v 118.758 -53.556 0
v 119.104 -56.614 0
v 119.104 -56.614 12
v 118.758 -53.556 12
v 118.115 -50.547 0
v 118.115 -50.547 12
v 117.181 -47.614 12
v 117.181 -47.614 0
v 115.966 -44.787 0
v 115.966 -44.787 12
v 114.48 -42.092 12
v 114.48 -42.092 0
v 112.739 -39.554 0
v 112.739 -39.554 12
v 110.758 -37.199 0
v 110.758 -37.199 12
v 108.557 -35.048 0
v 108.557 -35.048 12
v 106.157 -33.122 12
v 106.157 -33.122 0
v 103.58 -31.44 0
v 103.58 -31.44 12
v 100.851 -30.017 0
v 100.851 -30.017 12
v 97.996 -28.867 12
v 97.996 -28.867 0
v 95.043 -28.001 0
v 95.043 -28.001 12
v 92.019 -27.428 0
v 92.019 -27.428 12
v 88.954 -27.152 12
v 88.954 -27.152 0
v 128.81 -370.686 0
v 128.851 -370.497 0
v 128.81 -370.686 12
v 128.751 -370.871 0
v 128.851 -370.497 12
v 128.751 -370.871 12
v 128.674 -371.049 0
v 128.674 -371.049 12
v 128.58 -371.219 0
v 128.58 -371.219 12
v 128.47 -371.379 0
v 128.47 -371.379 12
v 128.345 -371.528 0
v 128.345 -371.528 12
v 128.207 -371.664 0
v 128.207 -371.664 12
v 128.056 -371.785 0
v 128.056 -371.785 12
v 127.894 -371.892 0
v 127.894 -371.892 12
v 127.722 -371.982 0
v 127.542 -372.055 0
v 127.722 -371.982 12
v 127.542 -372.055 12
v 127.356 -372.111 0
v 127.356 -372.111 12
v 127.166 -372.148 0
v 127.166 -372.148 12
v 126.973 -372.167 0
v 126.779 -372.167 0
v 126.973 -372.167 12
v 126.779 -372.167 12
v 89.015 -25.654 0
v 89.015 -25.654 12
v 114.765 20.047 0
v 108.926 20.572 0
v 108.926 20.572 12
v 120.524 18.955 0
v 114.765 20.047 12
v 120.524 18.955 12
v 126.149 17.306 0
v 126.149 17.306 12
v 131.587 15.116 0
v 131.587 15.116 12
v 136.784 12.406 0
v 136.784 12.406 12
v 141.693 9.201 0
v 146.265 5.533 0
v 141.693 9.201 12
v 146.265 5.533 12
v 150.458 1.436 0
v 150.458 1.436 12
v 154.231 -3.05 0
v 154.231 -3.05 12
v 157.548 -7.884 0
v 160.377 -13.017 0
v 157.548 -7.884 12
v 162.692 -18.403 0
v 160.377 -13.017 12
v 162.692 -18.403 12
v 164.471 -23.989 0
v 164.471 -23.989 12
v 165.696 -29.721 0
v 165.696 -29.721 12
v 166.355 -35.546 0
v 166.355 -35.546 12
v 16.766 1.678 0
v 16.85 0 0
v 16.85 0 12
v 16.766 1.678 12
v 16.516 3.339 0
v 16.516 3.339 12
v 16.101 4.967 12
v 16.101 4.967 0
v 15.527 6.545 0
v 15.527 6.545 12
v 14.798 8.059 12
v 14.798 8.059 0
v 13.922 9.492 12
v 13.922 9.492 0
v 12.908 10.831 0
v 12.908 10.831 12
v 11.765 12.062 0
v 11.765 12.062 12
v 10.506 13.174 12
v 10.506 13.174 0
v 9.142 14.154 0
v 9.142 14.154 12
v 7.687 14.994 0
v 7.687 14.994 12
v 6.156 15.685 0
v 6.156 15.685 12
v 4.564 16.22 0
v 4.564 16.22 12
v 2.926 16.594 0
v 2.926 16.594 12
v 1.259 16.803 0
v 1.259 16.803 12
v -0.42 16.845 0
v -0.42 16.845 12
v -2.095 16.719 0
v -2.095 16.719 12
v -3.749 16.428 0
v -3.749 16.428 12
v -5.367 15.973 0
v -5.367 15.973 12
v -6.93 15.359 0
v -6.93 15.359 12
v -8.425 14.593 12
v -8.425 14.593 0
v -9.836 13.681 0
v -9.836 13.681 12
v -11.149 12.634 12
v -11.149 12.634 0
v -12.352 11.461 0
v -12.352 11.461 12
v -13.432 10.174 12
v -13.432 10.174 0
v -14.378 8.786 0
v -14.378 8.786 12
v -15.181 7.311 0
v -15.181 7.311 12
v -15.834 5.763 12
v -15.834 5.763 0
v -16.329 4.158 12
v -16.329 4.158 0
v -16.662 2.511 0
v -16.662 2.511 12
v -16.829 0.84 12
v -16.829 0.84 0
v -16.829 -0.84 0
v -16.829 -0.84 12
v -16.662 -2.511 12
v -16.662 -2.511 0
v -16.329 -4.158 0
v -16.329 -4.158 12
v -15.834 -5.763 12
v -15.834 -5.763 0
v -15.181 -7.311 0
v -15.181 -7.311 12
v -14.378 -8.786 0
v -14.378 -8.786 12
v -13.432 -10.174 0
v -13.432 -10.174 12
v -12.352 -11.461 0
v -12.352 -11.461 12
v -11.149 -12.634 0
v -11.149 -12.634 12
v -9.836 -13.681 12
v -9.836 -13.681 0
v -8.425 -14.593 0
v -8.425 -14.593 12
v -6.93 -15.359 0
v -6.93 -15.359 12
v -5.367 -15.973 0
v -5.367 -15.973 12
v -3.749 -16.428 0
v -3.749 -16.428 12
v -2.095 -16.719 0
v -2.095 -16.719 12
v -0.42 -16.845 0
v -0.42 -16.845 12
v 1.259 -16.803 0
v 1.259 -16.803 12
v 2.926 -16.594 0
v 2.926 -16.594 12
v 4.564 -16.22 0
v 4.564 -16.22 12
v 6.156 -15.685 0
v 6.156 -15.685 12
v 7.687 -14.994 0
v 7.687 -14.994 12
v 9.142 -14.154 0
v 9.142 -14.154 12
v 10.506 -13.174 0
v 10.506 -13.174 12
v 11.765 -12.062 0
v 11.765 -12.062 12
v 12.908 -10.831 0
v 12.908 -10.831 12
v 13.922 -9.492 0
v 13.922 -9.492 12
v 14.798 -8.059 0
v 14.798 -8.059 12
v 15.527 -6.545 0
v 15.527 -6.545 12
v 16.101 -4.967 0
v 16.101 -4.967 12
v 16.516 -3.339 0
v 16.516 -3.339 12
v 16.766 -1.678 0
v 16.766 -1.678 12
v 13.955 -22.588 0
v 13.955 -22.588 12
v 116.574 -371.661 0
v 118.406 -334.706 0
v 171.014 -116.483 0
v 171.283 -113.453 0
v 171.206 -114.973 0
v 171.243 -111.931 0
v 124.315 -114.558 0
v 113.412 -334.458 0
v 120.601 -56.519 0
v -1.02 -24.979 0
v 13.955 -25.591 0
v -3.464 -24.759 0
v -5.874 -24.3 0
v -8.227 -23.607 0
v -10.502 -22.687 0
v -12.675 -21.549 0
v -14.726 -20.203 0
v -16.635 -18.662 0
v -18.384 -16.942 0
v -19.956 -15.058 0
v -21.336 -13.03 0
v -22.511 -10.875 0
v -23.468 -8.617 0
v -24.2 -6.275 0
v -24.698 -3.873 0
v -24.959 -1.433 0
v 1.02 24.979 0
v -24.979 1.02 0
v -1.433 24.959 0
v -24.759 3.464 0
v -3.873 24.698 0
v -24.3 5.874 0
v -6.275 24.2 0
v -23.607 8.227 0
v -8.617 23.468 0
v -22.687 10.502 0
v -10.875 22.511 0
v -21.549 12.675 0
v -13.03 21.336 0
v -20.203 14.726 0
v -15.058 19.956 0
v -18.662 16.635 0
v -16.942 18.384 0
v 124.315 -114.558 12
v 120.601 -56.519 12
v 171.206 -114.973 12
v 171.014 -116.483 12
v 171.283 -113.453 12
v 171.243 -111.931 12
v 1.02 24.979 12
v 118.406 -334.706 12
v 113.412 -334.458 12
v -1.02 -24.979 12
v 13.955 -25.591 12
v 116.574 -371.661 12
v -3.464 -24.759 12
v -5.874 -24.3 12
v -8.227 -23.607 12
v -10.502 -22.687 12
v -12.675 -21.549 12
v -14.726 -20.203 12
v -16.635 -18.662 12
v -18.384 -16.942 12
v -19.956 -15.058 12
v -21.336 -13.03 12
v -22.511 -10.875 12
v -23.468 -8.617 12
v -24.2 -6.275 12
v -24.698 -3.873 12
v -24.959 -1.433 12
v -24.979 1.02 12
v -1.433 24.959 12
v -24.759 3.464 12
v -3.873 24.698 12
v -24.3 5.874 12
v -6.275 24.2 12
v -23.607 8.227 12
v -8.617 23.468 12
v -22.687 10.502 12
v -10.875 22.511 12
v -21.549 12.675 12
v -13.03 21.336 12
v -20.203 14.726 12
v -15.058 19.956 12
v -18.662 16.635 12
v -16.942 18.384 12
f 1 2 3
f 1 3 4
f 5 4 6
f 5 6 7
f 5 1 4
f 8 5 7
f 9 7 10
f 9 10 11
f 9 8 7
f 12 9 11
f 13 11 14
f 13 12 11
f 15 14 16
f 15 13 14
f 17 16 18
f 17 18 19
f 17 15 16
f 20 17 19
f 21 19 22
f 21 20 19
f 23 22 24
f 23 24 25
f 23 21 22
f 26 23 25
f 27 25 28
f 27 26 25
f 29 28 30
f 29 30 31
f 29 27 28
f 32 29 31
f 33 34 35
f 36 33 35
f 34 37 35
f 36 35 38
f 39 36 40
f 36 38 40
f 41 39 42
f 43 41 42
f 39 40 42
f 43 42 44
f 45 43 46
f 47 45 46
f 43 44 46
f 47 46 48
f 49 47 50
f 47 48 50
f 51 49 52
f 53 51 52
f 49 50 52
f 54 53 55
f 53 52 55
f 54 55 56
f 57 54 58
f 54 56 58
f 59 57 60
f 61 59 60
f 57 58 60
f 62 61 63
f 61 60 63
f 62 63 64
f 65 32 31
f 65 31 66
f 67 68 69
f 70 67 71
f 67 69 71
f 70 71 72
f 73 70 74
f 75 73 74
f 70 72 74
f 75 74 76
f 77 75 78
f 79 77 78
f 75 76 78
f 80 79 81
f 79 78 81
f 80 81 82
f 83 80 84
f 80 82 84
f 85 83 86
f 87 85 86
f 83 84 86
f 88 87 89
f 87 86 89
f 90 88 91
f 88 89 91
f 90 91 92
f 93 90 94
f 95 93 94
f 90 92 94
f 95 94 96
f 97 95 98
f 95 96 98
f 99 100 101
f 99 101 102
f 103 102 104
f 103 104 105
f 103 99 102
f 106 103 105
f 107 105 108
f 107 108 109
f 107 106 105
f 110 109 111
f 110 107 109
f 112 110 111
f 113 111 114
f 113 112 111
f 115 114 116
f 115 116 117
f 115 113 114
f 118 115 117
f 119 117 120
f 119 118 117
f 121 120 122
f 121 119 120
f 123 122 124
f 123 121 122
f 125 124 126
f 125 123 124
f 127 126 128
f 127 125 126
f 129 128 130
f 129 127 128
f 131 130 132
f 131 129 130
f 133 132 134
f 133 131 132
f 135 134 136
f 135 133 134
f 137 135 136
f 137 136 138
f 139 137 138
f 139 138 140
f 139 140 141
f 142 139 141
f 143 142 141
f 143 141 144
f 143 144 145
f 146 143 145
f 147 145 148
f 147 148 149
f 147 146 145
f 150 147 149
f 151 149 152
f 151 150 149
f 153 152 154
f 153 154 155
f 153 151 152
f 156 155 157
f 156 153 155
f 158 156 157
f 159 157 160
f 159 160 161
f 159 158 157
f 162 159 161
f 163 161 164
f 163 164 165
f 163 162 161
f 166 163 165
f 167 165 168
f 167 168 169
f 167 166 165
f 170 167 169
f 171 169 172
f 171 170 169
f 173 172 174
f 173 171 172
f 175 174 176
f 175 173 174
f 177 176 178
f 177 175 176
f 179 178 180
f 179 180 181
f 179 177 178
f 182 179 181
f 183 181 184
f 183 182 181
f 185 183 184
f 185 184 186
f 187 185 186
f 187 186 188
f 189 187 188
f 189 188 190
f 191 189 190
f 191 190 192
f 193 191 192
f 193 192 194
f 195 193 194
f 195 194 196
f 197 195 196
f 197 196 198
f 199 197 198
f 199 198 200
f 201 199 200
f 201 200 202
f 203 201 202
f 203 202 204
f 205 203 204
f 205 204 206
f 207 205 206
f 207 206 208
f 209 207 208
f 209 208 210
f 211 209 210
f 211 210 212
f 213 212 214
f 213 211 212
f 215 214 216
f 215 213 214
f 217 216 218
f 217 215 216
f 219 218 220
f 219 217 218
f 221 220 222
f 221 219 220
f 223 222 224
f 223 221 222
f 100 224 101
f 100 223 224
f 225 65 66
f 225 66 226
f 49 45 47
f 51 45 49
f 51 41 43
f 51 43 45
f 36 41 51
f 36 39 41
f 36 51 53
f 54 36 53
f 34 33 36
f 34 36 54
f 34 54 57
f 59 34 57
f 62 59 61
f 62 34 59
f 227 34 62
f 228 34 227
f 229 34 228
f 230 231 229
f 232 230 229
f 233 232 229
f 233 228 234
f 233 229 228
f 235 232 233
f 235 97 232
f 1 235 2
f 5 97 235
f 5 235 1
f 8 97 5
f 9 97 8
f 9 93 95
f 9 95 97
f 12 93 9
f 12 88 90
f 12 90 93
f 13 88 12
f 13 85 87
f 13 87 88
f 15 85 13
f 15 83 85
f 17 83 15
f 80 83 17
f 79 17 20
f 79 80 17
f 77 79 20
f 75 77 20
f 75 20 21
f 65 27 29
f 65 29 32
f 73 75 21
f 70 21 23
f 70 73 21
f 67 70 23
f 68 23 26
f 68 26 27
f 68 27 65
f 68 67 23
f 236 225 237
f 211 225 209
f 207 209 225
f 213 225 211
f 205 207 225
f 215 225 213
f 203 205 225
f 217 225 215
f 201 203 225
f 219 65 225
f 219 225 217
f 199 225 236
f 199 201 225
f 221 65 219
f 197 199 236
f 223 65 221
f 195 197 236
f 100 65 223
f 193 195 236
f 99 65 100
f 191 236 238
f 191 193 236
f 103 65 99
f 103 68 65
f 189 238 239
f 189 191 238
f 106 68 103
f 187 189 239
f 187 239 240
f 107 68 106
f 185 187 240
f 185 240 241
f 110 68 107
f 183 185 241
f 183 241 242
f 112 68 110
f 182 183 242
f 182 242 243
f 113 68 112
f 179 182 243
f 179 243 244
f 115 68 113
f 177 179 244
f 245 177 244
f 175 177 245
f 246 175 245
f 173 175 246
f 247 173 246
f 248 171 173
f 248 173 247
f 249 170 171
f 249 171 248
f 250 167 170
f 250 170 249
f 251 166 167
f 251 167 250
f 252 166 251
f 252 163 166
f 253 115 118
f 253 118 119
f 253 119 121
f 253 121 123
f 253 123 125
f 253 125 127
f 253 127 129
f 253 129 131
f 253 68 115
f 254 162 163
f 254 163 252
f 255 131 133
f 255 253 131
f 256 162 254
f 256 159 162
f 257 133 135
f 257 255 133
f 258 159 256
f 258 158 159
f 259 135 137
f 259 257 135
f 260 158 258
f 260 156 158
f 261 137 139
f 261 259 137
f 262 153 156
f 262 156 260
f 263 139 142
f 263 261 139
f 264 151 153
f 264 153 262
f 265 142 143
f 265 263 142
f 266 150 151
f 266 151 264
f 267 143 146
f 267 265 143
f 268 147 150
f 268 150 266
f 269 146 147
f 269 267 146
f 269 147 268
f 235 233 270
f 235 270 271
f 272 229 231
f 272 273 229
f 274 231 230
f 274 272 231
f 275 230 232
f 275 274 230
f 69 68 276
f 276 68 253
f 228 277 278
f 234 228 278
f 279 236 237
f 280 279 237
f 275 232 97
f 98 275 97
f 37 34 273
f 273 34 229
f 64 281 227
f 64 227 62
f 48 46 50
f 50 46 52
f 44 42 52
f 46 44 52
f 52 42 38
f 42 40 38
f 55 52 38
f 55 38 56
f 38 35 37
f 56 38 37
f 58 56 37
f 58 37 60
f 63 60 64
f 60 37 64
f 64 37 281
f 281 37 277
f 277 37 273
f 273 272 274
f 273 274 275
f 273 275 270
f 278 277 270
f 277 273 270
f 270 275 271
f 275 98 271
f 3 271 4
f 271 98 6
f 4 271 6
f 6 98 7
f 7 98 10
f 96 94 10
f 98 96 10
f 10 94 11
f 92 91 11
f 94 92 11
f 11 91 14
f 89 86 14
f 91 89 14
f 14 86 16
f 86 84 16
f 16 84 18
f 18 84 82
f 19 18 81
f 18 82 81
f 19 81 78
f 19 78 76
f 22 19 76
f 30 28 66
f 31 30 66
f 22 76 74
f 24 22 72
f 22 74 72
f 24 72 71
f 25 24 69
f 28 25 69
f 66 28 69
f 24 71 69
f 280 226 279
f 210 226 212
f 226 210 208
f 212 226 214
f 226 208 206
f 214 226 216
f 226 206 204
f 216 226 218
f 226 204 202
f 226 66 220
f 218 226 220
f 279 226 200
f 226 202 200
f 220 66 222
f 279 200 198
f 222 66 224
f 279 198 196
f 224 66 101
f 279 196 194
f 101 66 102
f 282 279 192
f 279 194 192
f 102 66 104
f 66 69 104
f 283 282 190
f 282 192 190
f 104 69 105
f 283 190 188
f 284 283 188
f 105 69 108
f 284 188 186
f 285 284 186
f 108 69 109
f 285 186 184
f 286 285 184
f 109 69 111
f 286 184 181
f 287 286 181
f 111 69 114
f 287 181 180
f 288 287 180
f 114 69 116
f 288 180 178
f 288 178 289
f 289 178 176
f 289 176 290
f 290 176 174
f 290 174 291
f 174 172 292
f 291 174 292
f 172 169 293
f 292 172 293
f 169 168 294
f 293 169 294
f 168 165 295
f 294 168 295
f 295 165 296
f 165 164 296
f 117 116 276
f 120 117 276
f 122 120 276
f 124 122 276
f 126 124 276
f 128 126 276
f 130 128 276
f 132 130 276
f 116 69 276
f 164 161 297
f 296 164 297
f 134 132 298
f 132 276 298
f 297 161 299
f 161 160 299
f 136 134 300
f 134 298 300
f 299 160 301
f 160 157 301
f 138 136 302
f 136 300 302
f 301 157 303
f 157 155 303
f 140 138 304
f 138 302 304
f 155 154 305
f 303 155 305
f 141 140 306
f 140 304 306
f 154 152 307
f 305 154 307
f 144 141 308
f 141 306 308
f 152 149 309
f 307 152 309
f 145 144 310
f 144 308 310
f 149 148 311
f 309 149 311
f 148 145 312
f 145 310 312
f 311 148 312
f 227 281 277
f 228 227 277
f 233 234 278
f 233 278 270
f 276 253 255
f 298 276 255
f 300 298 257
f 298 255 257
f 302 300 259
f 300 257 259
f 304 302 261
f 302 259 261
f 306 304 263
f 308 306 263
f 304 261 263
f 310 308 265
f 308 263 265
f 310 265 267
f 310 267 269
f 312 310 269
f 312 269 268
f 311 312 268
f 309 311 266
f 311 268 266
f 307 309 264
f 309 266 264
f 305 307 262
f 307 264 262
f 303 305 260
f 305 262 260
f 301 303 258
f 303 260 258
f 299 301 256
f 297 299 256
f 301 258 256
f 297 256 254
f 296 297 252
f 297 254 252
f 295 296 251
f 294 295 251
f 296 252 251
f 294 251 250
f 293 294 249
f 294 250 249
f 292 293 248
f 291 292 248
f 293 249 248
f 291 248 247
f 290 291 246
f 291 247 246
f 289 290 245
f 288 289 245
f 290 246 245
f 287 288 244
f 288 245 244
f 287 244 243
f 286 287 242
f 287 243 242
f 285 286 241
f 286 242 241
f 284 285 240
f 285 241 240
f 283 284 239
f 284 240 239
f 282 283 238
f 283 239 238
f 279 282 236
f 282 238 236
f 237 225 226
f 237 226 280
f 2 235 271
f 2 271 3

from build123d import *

# Parameters (mm, degrees)
SKETCH_1_R               = 16.85
EXTRUDE_1_DEPTH          = 12
FILLET_1_R               = 30
FILLET_2_R               = 60
CUT_EXTRUDE_1_DEPTH      = 410.990466147
CUT_EXTRUDE_1_DEPTH_BACK = 410.990466147
FILLET_3_R               = 2
FILLET_4_R               = 20
CUT_EXTRUDE_2_DEPTH      = 410.868383554
CUT_EXTRUDE_2_DEPTH_BACK = 410.868383554
EXTRUDE_START            = -12
EXTRUDE_2_DEPTH          = 12


with BuildPart() as part:
    # Sketch 1 → Бобышка-Вытянуть1 (new body)
    with BuildSketch(Plane.XY):
        with BuildLine():
            Line((-1.020104874, -24.979179051), (115.882453083, -29.75326986))
            Line((115.882453083, -29.75326986), (121.310616212, -114.579769523))
            Line((121.310616212, -114.579769523), (108.583485608, -371.264440173))
            Line((108.583485608, -371.264440173), (128.558946359, -372.254878352))
            Line((128.558946359, -372.254878352), (171.389870978, -114.220142814))
            Line((171.389870978, -114.220142814), (162.905370512, 18.368075133))
            Line((162.905370512, 18.368075133), (1.020104874, 24.979179051))
            ThreePointArc((1.020104874, 24.979179051), (-24.979179051, 1.020104874), (-1.020104874, -24.979179051))
        make_face()
        Circle(SKETCH_1_R, mode=Mode.SUBTRACT)
    extrude(amount=EXTRUDE_1_DEPTH)

    # Скругление1
    fillet_1_edges = [part.edges().sort_by_distance(p)[0] for p in [
        (115.882453083, -29.75326986, 6),
    ]]
    fillet(fillet_1_edges, radius=FILLET_1_R)

    # Скругление2
    fillet_2_edges = [part.edges().sort_by_distance(p)[0] for p in [
        (162.905370512, 18.368075133, 6),
    ]]
    fillet(fillet_2_edges, radius=FILLET_2_R)

    # Sketch 2 → Вырез-Вытянуть1 (cut, two sides: drawn at the far end of the back side and taken through both)
    with BuildSketch(Plane(origin=(0, 0, 0), x_dir=(-1, 0, 0), z_dir=(0, 0, -1)).offset(-CUT_EXTRUDE_1_DEPTH_BACK)):
        Polygon((-108.583485608, -371.264440173), (-116.573669908, -371.660615445), (-118.40598054, -334.706013056), (-110.41579624, -334.309837784), align=None)
    extrude(amount=CUT_EXTRUDE_1_DEPTH + CUT_EXTRUDE_1_DEPTH_BACK, mode=Mode.SUBTRACT)

    # Скругление3
    fillet_3_edges = [part.edges().sort_by_distance(p)[0] for p in [
        (128.558946359, -372.254878352, 6),
    ]]
    fillet(fillet_3_edges, radius=FILLET_3_R)

    # Скругление4
    fillet_4_edges = [part.edges().sort_by_distance(p)[0] for p in [
        (171.389870978, -114.220142814, 6),
    ]]
    fillet(fillet_4_edges, radius=FILLET_4_R)

    # Эскиз3 → Вырез-Вытянуть2 (cut, two sides: drawn at the far end of the back side and taken through both)
    with BuildSketch(Plane.XY.offset(12).offset(-CUT_EXTRUDE_2_DEPTH_BACK)):
        with BuildLine():
            Line((13.955291323, -25.590747374), (88.892828475, -28.651061996))
            ThreePointArc((88.892828475, -28.651061996), (108.635605286, -37.16939974), (117.607467213, -56.710254576))
            Line((117.607467213, -56.710254576), (121.310616212, -114.579769523))
            Line((121.310616212, -114.579769523), (110.41579624, -334.309837784))
            Line((110.41579624, -334.309837784), (113.412115352, -334.458403511))
            Line((113.412115352, -334.458403511), (124.315371498, -114.558191921))
            Line((124.315371498, -114.558191921), (120.601343672, -56.518672348))
            ThreePointArc((120.601343672, -56.518672348), (110.732295552, -35.023732029), (89.01524106, -25.65356051))
            Line((89.01524106, -25.65356051), (13.955291323, -22.588246777))
            Line((13.955291323, -22.588246777), (13.955291323, -25.590747374))
        make_face()
    extrude(amount=CUT_EXTRUDE_2_DEPTH + CUT_EXTRUDE_2_DEPTH_BACK, mode=Mode.SUBTRACT)

    # Эскиз4 → Бобышка-Вытянуть2 (add)
    with BuildSketch(Plane.XY.offset(12).offset(EXTRUDE_START)):
        with BuildLine():
            Line((120.601343672, -56.518672348), (119.104405442, -56.614463462))
            ThreePointArc((119.104405442, -56.614463462), (109.683950419, -36.096565885), (88.954034767, -27.152311253))
            Line((88.954034767, -27.152311253), (89.01524106, -25.65356051))
            ThreePointArc((89.01524106, -25.65356051), (110.732295552, -35.023732029), (120.601343672, -56.518672348))
        make_face()
    extrude(amount=EXTRUDE_2_DEPTH)


solid = part.part
